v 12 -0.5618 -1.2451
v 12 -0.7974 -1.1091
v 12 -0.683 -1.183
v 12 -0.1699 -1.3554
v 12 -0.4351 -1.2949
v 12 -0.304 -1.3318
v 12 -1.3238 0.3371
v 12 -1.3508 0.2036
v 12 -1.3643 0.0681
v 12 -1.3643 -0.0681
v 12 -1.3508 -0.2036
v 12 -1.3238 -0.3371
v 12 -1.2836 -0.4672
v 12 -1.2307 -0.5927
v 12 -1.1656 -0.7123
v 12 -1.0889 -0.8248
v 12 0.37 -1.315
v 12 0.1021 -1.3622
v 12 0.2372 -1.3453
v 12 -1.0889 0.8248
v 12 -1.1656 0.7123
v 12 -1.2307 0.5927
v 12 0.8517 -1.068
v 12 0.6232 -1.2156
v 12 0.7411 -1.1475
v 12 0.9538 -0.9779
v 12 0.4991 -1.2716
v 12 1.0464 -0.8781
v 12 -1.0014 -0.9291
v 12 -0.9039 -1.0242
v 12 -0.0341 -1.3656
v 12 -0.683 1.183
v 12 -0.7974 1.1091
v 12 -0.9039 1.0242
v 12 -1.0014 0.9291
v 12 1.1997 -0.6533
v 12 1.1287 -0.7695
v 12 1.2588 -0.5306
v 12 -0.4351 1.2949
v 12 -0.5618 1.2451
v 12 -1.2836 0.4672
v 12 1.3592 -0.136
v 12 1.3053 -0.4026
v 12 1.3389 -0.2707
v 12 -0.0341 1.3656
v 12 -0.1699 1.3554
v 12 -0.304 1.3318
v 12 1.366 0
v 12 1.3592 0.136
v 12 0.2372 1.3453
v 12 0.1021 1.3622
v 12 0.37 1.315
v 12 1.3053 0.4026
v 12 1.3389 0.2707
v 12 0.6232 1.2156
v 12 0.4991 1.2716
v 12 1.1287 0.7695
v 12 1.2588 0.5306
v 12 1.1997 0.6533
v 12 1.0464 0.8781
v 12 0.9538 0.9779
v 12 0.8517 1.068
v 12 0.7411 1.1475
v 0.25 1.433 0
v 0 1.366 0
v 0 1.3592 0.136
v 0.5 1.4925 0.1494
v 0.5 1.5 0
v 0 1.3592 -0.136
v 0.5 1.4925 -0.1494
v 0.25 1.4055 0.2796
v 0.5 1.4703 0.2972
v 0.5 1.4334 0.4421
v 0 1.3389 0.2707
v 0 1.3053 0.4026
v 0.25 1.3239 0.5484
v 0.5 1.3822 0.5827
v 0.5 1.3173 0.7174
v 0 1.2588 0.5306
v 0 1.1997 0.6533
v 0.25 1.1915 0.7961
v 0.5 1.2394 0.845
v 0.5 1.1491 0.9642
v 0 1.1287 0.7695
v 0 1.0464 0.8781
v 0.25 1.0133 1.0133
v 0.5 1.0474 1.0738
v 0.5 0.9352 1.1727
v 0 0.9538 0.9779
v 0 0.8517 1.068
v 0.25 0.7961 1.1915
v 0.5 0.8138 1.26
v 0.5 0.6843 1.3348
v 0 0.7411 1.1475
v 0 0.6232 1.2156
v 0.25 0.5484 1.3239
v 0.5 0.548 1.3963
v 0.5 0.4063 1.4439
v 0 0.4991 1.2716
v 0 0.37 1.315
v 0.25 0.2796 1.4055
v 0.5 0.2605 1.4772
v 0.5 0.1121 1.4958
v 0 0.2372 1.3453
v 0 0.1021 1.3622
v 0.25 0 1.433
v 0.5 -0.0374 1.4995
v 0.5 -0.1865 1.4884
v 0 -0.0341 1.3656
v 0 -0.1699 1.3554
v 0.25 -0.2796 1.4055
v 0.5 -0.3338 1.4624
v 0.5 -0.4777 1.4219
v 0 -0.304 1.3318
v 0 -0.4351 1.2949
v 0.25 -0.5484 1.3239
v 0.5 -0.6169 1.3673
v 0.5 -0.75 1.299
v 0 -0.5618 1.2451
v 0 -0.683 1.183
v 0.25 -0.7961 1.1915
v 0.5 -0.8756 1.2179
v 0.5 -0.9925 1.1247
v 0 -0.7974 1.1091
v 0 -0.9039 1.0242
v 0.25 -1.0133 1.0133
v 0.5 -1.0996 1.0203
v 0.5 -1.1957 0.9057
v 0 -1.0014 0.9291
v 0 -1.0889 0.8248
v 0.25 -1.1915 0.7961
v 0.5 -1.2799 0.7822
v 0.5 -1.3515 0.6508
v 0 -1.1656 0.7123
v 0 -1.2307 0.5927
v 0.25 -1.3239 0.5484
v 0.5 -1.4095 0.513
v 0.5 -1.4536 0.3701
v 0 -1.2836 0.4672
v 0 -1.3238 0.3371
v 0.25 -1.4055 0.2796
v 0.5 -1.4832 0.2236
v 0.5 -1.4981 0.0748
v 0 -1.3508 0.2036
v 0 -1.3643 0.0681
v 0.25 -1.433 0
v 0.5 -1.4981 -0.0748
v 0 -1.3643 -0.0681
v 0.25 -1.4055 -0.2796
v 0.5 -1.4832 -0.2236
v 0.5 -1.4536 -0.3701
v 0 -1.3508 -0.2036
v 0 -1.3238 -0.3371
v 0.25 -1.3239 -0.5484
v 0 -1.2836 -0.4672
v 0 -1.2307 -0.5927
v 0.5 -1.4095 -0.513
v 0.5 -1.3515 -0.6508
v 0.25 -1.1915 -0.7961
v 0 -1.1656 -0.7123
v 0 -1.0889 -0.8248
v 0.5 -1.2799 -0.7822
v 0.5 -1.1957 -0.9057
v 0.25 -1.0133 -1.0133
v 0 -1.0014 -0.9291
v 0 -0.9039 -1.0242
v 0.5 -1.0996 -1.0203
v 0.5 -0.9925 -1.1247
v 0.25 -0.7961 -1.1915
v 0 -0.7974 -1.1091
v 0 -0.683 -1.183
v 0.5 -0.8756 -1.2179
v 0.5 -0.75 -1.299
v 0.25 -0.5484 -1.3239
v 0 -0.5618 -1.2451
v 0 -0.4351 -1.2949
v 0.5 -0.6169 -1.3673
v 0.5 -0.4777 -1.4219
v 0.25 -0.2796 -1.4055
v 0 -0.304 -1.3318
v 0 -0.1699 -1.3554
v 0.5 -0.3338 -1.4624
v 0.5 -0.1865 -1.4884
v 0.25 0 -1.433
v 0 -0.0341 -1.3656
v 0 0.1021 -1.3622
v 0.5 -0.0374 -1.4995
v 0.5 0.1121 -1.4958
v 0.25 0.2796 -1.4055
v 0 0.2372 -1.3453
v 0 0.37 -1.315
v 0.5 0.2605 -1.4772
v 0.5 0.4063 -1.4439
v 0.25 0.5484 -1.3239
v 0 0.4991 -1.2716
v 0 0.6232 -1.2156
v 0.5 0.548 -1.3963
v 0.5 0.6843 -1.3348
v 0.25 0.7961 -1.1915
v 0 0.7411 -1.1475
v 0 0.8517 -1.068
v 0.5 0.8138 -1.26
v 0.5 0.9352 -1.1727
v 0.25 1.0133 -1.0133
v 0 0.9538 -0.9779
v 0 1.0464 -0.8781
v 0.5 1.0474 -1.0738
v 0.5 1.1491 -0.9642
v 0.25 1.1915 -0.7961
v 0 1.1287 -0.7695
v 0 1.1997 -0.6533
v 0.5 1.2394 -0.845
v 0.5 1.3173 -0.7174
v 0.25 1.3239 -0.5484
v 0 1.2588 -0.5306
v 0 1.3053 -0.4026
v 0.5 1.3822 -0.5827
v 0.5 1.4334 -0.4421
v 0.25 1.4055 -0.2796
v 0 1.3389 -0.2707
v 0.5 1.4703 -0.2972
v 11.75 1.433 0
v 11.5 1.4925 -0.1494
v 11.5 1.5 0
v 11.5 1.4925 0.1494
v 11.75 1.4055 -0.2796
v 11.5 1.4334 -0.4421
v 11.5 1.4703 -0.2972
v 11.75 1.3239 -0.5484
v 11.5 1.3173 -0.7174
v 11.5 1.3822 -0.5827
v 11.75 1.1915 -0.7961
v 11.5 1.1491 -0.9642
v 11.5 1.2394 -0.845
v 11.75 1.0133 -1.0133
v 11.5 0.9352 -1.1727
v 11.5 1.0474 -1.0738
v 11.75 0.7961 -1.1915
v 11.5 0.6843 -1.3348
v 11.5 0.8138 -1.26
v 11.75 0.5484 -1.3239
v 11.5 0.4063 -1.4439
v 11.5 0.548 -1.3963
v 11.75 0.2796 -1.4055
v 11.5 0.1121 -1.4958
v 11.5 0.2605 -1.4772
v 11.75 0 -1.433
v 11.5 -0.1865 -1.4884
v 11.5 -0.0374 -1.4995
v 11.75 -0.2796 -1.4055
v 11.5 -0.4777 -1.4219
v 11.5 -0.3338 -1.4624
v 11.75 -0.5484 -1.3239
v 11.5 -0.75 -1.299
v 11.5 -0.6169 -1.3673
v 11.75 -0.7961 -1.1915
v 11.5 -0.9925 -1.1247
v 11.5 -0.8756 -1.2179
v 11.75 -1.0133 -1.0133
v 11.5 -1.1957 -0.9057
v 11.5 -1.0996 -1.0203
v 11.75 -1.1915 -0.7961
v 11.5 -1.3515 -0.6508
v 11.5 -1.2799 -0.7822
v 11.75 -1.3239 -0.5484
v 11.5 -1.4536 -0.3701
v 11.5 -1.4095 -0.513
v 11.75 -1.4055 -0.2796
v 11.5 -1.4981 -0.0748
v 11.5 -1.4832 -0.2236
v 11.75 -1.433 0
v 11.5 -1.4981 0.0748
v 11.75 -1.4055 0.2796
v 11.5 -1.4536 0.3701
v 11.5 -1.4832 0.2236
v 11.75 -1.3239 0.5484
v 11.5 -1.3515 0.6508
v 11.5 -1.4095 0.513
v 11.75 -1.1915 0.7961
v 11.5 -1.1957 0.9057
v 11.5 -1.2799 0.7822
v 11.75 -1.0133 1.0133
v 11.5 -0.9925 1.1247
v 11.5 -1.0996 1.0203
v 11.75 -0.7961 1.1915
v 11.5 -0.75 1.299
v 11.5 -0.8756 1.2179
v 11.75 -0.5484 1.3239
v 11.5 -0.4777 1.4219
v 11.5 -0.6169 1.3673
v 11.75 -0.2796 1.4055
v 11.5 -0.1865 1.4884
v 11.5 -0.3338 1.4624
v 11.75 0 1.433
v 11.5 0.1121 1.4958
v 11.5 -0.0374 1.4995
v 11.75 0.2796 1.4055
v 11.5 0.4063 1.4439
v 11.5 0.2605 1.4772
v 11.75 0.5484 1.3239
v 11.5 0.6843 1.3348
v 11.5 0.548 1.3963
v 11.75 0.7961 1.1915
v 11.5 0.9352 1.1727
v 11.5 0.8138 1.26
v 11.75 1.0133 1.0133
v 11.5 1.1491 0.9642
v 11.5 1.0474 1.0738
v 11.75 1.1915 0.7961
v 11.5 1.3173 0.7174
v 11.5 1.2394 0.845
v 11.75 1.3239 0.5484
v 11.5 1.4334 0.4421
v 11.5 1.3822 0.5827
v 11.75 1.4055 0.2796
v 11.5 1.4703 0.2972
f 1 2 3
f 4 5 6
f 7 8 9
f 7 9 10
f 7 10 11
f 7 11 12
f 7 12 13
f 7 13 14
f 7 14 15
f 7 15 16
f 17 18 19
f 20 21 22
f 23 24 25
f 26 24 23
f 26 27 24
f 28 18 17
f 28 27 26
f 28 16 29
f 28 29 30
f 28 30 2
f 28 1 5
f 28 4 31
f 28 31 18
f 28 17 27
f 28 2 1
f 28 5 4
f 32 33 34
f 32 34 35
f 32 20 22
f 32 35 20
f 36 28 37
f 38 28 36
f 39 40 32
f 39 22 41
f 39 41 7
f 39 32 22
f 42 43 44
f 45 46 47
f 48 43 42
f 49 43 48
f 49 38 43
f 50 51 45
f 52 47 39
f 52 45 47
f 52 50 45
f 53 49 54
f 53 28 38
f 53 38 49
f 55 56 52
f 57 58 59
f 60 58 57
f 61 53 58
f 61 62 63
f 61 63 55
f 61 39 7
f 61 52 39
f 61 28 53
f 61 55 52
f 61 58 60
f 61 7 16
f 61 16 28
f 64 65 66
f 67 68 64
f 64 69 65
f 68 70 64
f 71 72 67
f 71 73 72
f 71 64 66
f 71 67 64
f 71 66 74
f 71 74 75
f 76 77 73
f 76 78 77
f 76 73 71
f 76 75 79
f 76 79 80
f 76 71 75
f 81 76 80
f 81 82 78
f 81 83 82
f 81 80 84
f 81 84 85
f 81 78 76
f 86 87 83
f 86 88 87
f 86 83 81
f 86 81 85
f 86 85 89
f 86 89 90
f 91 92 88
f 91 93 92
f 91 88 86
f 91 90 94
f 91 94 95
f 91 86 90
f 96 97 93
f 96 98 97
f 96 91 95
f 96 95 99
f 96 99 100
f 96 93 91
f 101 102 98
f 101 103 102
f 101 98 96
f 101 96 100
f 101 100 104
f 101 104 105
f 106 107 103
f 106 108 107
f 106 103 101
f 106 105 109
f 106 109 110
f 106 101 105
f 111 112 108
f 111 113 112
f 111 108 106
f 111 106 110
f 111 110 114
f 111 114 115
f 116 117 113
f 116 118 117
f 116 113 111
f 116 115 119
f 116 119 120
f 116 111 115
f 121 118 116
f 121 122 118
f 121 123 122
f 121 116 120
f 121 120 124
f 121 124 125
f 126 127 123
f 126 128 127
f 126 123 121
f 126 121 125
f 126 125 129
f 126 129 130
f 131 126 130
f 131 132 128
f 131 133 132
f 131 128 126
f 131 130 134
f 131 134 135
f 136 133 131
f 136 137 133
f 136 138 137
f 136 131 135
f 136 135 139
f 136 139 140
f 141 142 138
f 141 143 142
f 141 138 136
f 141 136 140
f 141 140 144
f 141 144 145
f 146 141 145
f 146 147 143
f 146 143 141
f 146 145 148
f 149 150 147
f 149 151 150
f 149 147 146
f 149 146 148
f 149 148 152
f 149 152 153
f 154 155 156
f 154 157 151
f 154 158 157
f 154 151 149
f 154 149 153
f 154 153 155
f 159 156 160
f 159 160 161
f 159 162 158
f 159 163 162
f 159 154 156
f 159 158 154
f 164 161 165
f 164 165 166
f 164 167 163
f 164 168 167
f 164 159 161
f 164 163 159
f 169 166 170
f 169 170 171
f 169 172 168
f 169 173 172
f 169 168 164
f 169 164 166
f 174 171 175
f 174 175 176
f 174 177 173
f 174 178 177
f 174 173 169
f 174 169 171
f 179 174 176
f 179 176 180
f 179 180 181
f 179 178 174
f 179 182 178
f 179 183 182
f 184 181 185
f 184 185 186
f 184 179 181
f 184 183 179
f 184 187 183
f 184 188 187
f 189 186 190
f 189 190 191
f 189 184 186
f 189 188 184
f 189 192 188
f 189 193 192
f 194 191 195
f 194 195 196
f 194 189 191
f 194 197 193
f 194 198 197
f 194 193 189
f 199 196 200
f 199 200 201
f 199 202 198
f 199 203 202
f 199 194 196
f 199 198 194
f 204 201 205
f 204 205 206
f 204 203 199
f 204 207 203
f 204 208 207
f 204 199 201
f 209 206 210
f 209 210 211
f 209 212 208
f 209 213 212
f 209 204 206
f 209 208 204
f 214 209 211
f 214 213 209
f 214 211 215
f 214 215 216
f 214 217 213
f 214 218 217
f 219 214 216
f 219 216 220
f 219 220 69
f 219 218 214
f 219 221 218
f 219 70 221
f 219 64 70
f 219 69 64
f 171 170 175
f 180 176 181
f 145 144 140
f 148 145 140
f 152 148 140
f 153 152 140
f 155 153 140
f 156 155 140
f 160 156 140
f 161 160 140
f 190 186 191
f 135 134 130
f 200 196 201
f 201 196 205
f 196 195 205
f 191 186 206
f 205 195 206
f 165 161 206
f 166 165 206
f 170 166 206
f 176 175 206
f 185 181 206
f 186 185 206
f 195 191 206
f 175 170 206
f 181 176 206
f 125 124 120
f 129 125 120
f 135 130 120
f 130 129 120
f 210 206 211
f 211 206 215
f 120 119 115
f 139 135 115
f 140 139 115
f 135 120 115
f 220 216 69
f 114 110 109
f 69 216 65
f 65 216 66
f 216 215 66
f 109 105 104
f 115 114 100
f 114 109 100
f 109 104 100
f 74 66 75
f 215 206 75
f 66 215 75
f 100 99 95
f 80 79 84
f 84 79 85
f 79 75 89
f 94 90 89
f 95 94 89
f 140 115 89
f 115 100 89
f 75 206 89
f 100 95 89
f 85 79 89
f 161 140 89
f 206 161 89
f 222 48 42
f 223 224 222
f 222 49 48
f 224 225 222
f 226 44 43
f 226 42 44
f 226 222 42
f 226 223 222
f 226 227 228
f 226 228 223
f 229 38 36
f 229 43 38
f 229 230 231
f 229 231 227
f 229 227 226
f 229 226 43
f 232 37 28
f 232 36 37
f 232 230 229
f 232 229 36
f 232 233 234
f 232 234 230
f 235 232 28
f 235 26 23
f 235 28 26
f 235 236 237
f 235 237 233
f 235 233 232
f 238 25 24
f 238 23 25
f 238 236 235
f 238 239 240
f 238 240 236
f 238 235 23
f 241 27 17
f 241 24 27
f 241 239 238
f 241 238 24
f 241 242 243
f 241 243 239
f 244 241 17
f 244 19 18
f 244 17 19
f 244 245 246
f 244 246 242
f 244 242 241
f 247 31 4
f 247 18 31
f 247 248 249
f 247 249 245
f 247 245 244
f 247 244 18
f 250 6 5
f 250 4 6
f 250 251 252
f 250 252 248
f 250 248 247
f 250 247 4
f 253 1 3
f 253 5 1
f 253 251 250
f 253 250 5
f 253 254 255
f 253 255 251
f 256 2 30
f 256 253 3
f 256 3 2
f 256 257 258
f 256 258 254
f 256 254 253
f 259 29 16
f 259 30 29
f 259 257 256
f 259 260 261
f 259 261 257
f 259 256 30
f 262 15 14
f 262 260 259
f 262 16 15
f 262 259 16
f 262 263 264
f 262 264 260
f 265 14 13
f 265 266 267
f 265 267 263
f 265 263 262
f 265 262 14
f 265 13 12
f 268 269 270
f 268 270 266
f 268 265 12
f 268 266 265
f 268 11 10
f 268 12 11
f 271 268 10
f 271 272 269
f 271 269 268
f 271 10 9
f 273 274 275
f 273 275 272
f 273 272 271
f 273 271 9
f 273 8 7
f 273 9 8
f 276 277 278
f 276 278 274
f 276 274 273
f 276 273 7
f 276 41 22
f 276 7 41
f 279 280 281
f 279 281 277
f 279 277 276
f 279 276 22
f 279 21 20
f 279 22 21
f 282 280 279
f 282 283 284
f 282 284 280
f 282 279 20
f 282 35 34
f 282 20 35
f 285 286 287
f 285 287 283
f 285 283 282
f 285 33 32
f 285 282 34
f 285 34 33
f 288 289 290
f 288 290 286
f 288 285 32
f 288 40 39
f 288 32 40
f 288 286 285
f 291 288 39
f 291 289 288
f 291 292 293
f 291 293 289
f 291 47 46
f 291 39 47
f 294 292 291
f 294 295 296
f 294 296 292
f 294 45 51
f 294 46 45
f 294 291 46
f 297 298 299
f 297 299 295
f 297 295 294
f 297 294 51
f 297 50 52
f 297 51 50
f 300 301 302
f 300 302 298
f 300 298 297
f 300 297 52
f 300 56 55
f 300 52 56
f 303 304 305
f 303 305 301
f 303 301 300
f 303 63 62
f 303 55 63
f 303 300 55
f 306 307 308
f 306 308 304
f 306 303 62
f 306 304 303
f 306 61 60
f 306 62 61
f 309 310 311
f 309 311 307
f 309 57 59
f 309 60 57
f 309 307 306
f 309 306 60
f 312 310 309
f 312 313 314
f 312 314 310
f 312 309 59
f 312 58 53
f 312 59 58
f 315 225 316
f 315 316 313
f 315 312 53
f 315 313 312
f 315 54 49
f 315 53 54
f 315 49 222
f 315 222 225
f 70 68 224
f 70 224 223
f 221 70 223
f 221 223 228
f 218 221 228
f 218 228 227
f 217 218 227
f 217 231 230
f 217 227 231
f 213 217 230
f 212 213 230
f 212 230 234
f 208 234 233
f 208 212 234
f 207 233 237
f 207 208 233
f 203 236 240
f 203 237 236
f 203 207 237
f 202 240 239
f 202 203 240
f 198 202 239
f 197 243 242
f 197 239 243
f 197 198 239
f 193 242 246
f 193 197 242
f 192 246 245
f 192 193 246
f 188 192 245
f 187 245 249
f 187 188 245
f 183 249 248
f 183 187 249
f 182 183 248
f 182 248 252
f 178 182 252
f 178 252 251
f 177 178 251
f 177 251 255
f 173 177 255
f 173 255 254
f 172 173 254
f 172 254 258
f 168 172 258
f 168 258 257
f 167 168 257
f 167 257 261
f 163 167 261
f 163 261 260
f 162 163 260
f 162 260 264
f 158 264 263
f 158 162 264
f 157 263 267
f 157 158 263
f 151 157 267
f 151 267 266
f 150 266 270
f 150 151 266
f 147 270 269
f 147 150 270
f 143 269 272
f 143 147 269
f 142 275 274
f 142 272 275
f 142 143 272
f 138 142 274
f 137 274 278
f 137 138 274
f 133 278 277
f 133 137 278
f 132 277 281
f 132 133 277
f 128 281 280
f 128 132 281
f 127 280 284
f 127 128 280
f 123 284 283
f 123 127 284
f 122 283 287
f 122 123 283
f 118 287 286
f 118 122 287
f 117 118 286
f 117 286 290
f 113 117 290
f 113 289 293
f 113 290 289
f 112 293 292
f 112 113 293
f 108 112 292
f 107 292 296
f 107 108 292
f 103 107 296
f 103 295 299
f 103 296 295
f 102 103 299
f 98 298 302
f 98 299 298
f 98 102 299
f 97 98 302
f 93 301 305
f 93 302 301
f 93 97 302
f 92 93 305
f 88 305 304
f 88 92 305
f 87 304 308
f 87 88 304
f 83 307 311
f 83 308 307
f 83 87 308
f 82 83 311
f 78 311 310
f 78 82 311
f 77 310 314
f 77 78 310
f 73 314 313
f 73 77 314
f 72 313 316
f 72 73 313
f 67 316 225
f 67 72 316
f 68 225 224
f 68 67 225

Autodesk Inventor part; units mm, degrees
ref_plane "YZ Plane" through (0, 0, 0) normal (1, 0, 0) x (0, 1, 0)
ref_plane "XZ Plane" through (0, 0, 0) normal (0, 1, 0) x (-1, 0, 0)
ref_plane "XY Plane" through (0, 0, 0) normal (0, 0, 1) x (1, 0, 0)
sketch "Sketch" plane through (0, 0, 0) normal (1, 0, 0) x (0, 1, 0)
  circle A0 centre (0, 0) radius 1.5
  dimension "d1" = 3
extrude "Body" add sketch "Sketch" along normal blind 12
chamfer "Chamfer1" distance 0.5 angle 15 1 edges at (0, -1.5, 0) measured on face at (8, 1.4806, -0.2406)
chamfer "Chamfer2" distance 0.5 angle 15 1 edges at (12, -1.5, 0) measured on face at (8.1667, 1.4806, -0.2406)
equation "\"d1\" = NND"
equation "\"d2\" = NLG"
equation "\"d4\" = PHH"
equation "\"d5\" = FAWI"
equation "\"d11\" = PHH"
equation "\"d8\" = PHH"
equation "\"d9\" = FAWI"
equation "\"d12\" = PHH"
equation "\"NND\" = 3"
equation "\"NLG\" = 12"
equation "\"PHH\" = 0.5"
equation "\"FAWI\" = 15deg"
equation "\"PHH2\" = PHH"
equation "\"FAWI2\" = 15deg"
properties part number "ISO 8734 - 3 x 12 - A" material "Steel"
